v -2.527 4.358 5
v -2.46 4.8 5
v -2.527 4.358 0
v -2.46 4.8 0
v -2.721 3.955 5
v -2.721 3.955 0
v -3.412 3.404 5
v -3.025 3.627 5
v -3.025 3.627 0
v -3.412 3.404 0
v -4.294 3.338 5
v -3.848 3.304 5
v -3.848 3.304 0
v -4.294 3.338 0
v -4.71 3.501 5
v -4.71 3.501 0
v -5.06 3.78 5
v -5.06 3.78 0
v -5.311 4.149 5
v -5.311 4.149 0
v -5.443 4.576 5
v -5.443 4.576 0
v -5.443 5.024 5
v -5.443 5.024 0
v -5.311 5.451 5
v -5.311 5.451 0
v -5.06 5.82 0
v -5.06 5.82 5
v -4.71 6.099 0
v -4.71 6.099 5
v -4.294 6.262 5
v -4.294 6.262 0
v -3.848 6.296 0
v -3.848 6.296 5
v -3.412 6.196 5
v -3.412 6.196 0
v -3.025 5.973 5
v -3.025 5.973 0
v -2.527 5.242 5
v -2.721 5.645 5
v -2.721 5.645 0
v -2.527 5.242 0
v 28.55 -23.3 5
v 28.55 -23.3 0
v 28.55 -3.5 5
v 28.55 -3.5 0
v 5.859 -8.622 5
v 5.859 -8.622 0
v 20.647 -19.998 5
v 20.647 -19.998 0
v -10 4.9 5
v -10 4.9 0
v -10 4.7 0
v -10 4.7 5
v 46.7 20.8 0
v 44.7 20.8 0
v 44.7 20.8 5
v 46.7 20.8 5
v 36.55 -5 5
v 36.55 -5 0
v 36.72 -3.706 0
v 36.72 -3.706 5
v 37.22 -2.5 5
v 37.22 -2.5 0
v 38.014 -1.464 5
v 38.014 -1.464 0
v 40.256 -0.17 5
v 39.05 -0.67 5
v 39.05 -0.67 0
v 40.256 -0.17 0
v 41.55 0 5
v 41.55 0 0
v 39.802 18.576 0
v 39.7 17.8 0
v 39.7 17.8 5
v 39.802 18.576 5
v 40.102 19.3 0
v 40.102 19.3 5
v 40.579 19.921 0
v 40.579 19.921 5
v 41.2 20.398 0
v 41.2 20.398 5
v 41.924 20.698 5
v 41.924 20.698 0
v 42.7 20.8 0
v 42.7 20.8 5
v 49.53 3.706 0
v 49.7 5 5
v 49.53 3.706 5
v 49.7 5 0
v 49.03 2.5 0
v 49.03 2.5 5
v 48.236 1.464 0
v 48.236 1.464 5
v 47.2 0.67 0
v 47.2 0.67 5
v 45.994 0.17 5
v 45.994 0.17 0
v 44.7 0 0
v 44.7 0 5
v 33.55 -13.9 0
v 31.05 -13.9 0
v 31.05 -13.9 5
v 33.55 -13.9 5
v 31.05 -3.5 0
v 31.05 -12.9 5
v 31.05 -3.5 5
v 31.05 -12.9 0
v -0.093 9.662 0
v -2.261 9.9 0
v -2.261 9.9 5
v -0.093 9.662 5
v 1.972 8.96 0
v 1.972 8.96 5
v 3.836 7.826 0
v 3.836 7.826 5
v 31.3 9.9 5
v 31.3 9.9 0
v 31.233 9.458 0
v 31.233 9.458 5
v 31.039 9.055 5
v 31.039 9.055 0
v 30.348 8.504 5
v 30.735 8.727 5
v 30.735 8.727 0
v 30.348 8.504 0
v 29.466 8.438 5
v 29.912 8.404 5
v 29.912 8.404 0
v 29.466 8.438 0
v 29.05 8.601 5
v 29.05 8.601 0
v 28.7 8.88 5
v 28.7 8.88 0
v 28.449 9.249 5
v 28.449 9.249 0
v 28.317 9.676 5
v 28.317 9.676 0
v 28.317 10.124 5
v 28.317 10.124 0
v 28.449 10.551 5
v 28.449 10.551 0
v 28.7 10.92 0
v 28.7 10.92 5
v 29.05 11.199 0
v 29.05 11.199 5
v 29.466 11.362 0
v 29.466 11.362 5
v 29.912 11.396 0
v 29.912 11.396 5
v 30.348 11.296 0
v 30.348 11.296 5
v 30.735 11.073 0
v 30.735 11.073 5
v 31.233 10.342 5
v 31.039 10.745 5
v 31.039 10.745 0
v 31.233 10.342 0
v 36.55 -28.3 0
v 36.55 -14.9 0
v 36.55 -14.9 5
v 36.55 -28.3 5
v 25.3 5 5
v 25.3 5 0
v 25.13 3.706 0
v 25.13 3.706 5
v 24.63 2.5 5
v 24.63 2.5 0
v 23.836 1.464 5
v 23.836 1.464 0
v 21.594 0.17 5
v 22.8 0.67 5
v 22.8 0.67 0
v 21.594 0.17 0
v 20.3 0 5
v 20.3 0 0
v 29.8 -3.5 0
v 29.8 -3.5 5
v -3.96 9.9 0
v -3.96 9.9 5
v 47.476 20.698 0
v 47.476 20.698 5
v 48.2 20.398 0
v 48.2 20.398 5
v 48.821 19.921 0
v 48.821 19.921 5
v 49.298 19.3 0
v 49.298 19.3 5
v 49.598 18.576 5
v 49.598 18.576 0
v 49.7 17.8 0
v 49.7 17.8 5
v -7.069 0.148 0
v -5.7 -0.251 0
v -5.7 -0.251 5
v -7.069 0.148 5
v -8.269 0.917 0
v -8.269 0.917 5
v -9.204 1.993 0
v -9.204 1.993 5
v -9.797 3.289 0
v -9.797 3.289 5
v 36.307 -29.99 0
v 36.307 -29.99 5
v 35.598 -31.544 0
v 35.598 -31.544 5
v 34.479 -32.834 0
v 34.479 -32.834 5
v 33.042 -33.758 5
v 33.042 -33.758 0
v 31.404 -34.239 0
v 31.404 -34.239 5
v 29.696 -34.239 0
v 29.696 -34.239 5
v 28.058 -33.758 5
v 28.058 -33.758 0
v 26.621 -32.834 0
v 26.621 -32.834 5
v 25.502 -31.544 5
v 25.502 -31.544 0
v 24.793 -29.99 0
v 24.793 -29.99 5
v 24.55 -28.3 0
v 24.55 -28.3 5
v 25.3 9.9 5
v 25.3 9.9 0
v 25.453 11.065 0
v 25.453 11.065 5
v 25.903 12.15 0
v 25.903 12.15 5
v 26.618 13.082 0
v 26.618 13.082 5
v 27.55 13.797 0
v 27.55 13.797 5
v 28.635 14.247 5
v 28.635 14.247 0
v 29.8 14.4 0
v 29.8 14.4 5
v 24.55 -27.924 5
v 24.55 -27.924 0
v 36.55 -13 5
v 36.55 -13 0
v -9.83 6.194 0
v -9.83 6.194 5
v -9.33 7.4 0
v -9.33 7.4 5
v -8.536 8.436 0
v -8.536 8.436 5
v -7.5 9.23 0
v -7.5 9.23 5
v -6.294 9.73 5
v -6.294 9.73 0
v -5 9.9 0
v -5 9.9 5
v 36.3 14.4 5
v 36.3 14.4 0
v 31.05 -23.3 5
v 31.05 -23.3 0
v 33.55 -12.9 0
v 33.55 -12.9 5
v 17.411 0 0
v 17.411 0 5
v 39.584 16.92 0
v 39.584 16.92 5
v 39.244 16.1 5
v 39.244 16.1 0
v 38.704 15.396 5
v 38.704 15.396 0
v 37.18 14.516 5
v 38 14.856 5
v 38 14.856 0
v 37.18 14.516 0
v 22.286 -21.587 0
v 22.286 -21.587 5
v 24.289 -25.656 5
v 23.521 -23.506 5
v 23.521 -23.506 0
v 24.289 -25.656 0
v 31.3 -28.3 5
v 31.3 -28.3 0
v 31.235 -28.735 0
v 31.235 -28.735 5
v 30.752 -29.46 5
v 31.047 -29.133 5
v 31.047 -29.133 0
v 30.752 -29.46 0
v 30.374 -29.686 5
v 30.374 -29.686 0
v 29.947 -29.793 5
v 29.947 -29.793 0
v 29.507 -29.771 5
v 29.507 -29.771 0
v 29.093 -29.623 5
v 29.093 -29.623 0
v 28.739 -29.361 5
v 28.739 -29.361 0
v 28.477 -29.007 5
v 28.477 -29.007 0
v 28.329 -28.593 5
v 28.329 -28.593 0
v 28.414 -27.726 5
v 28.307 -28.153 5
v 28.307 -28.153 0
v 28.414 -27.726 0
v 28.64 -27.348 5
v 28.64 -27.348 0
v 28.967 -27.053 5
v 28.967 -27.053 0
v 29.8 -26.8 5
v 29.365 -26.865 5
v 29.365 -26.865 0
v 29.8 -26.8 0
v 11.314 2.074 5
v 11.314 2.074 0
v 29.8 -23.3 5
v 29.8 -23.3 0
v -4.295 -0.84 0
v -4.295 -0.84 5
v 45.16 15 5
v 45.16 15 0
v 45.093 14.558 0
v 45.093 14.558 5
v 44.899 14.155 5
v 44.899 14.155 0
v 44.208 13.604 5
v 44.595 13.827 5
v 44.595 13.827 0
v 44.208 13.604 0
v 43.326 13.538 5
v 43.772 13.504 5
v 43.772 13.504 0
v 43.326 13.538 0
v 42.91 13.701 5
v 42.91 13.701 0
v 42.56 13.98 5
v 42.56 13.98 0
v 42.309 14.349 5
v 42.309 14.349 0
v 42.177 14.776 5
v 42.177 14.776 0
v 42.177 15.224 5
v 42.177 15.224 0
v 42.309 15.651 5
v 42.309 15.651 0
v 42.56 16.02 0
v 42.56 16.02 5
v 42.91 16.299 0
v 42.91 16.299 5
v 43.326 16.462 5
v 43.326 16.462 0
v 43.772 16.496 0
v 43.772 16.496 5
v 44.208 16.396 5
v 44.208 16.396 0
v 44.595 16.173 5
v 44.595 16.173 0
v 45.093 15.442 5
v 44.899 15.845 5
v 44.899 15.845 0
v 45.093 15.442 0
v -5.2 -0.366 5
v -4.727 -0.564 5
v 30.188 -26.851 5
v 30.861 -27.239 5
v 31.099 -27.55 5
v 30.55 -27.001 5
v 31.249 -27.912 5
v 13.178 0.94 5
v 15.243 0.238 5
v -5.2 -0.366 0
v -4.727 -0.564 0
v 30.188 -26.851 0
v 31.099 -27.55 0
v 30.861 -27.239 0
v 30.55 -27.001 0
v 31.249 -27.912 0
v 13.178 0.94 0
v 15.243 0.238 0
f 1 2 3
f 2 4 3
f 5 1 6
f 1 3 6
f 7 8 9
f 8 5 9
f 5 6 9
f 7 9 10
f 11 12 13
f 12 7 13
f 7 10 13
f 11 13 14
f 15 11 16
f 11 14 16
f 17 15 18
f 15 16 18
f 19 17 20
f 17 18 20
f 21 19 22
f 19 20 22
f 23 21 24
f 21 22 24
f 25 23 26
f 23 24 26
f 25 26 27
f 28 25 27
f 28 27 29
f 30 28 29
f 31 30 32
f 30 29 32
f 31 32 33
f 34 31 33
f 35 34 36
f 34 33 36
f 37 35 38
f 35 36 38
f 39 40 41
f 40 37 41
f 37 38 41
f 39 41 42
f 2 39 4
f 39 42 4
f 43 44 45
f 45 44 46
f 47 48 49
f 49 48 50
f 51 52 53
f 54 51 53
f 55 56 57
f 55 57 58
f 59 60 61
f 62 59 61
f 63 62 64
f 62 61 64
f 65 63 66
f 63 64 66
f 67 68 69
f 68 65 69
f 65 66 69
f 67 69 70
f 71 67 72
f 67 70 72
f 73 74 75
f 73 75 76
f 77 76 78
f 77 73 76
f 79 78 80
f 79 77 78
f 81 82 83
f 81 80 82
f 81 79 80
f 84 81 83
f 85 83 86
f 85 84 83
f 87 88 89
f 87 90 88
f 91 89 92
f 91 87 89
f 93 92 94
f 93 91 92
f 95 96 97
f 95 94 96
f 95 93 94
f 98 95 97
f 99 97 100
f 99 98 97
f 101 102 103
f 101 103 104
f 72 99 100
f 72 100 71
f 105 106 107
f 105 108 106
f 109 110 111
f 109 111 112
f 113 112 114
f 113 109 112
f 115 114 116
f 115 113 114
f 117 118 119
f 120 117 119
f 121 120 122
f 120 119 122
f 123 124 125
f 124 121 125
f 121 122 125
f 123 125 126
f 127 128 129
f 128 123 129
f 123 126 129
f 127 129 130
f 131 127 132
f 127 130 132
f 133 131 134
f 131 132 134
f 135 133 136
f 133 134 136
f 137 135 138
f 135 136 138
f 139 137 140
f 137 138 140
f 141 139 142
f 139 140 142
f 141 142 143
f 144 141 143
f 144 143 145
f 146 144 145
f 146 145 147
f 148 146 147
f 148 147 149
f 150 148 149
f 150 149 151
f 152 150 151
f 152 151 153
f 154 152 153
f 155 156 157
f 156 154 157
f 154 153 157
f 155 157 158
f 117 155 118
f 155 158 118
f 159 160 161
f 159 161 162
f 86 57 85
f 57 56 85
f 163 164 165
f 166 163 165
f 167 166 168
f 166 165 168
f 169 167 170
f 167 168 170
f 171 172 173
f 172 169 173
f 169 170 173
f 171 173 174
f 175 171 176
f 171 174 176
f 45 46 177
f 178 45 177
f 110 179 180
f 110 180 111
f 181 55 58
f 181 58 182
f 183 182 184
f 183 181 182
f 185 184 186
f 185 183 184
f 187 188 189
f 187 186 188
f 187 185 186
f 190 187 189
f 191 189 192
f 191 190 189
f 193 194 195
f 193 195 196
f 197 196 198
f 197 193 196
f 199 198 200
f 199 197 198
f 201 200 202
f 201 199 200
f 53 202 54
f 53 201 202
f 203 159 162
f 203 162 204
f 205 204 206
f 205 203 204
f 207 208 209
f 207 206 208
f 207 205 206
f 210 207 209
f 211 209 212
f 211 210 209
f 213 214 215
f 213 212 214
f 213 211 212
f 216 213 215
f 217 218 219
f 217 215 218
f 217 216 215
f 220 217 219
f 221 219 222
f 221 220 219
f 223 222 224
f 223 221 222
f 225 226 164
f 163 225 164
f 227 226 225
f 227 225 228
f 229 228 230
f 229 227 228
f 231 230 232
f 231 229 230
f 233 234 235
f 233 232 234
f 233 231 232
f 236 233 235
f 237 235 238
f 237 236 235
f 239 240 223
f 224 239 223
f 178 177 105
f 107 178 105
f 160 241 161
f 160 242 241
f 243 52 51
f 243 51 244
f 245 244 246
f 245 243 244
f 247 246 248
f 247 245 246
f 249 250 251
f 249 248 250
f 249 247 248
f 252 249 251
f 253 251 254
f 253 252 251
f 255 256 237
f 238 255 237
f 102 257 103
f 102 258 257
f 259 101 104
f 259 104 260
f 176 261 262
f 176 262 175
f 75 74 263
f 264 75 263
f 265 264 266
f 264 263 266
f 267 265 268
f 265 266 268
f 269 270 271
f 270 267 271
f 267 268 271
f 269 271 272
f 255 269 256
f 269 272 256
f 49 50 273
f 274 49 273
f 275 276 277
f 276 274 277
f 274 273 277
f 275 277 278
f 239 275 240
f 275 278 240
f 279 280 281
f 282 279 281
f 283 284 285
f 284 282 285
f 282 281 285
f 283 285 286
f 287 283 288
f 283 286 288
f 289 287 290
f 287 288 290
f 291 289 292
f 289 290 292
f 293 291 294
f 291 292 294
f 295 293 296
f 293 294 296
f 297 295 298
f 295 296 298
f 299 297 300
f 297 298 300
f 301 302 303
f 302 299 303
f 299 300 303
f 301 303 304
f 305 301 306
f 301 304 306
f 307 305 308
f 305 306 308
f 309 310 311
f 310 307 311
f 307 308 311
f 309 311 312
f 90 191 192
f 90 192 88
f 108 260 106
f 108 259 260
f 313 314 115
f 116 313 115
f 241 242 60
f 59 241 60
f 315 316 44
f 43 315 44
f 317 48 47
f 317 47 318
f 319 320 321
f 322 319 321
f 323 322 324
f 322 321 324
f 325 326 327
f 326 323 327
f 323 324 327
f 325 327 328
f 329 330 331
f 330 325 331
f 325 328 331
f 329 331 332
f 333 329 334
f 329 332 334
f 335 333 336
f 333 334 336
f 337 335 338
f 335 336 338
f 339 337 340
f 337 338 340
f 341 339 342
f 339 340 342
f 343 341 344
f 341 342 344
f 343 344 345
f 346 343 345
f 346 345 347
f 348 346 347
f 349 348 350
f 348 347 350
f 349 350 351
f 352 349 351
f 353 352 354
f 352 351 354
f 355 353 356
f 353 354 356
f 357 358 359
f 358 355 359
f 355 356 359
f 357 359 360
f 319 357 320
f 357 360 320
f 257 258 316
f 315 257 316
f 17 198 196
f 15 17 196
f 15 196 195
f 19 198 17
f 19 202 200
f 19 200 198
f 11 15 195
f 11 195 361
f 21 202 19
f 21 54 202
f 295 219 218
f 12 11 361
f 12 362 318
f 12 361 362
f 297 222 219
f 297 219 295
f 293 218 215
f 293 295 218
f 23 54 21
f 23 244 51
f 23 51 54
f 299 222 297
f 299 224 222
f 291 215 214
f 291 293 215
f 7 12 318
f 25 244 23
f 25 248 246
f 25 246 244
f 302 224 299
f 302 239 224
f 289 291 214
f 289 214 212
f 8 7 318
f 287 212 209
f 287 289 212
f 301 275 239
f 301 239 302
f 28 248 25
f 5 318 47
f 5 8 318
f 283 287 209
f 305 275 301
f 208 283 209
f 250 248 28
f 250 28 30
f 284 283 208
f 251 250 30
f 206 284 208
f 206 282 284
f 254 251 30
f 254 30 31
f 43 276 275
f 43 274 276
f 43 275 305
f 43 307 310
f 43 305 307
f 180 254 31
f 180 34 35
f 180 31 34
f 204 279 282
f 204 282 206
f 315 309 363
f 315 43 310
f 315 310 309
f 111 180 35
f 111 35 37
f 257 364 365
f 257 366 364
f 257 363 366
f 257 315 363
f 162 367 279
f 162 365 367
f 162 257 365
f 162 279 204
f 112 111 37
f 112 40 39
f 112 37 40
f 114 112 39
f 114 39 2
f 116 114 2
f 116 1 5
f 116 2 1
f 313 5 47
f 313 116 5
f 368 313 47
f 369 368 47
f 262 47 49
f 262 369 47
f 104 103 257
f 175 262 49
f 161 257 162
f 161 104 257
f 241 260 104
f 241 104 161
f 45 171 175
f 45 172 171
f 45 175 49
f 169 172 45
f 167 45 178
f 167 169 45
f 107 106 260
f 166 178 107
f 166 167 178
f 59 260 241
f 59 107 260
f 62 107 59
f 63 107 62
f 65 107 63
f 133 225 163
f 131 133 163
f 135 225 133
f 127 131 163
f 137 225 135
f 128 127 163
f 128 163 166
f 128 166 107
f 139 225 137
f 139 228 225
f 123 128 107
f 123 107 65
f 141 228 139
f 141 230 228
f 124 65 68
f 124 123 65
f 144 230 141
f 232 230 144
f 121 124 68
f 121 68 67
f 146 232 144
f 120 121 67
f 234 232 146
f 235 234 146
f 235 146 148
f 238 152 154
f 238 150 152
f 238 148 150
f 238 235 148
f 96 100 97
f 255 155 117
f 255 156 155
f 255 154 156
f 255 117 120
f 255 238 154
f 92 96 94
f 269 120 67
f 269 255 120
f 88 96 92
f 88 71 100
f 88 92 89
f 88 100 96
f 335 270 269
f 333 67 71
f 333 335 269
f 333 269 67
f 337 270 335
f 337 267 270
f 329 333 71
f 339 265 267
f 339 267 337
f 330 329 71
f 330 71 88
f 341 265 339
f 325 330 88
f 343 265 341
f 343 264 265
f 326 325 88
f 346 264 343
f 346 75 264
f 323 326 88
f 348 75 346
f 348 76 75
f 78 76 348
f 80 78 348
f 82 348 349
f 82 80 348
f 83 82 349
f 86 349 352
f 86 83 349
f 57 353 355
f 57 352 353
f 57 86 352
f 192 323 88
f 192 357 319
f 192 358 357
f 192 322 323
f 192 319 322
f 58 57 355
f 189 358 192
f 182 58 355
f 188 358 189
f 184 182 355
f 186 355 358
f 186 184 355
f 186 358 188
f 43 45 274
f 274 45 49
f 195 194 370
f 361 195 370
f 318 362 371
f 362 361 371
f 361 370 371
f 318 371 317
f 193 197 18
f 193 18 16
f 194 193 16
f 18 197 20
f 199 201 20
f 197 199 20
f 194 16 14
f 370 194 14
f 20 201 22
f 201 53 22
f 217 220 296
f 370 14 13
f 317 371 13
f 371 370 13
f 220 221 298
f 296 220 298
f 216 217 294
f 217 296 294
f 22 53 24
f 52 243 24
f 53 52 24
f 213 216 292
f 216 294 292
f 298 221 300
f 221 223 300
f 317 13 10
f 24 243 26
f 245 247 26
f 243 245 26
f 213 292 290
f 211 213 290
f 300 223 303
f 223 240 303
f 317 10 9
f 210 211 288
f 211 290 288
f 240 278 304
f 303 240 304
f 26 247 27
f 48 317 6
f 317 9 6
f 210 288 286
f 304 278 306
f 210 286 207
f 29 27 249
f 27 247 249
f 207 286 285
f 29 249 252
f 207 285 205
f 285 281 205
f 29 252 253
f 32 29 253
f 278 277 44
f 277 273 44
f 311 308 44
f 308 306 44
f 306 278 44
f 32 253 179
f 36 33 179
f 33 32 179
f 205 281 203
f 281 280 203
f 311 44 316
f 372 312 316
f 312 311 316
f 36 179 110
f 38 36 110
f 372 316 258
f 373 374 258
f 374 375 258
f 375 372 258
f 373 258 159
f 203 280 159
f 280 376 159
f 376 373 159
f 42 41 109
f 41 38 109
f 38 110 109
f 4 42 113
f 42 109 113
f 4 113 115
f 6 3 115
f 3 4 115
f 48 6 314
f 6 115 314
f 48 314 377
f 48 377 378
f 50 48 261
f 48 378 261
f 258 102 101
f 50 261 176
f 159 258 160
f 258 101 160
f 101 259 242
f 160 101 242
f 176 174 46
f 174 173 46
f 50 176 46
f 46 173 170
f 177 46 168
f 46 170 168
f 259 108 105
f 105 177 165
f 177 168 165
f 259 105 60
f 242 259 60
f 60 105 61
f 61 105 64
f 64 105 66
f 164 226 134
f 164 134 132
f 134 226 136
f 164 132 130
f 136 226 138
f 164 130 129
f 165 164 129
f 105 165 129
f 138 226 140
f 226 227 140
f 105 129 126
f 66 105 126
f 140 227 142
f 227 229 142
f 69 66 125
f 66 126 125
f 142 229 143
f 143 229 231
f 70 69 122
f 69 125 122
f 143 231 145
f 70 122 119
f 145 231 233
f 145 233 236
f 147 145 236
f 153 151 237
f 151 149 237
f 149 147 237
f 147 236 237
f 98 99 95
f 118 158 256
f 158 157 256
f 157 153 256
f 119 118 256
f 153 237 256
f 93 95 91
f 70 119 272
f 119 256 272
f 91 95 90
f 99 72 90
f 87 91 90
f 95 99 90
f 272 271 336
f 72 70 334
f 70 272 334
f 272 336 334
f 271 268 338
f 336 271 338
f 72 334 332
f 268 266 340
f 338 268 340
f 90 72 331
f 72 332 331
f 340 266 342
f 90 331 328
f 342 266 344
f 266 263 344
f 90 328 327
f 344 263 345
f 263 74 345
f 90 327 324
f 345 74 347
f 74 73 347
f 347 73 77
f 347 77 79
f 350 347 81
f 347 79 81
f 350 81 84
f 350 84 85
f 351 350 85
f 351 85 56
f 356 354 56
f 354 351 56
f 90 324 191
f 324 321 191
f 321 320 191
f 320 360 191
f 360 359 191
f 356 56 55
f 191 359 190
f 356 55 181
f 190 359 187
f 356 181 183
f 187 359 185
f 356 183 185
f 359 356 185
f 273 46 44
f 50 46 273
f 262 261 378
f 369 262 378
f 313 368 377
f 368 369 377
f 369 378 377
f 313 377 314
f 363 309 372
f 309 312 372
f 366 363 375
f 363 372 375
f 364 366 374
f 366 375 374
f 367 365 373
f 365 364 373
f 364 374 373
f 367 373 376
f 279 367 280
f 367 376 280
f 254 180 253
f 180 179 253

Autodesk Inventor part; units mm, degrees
ref_plane "YZ Plane" through (0, 0, 0) normal (1, 0, 0) x (0, 1, 0)
ref_plane "XZ Plane" through (0, 0, 0) normal (0, 1, 0) x (-1, 0, 0)
ref_plane "XY Plane" through (0, 0, 0) normal (0, 0, 1) x (1, 0, 0)
sketch "Sketch1" plane through (0, 0, 0) normal (0, 0, 1) x (1, 0, 0)
  line L0 (17.4112, 0) -> (20.3, 0)
  circle A0 centre (43.66, 15) radius 1.5
  circle A1 centre (-3.96, 4.8) radius 1.5
  line L1 (29.8, -3.5) -> (31.05, -3.5)
  line L2 (31.05, -23.3) -> (28.55, -23.3)
  line L3 (28.55, -23.3) -> (28.55, -3.5)
  line L4 (28.55, -3.5) -> (29.8, -3.5)
  line L5 (29.8, -23.3) -> (29.8, -28.3)
  circle A2 centre (29.8, -28.3) radius 1.5
  line L6 (31.05, -23.3) -> (31.05, -13.9)
  line L7 (31.05, -13.9) -> (33.55, -13.9)
  line L8 (33.55, -13.9) -> (33.55, -12.9)
  line L9 (33.55, -12.9) -> (31.05, -12.9)
  line L10 (31.05, -12.9) -> (31.05, -3.5)
  line L11 (36.55, -14.9) -> (36.55, -28.3)
  line L12 (49.7, 17.8) -> (49.7, 5)
  line L13 (36.55, -13) -> (36.55, -14.9)
  arc A3 (24.55, -28.3) -> (36.55, -28.3) centre (30.55, -28.3) ccw
  line L14 (24.55, -27.924) -> (24.55, -28.3)
  line L15 (5.8588, -8.6221) -> (20.6471, -19.9978)
  circle A4 centre (29.8, 9.9) radius 1.5
  arc A5 (29.8, 14.4) -> (25.3, 9.9) centre (29.8, 9.9) ccw
  line L16 (25.3, 9.9) -> (25.3, 5)
  line L17 (36.55, -13) -> (36.55, -5)
  line L18 (44.7, 0) -> (41.55, 0)
  line L19 (36.3, 14.4) -> (29.8, 14.4)
  arc A6 (36.3, 14.4) -> (39.7, 17.8) centre (36.3, 17.8) ccw
  arc A7 (41.55, 0) -> (36.55, -5) centre (41.55, -5) ccw
  arc A8 (44.7, 0) -> (49.7, 5) centre (44.7, 5) ccw
  arc A9 (20.3, 0) -> (25.3, 5) centre (20.3, 5) ccw
  arc A10 (24.55, -27.924) -> (20.6471, -19.9978) centre (14.55, -27.924) ccw
  line L20 (-3.96, 9.9) -> (-2.2612, 9.9)
  line L21 (-3.96, 9.9) -> (-5, 9.9)
  line L22 (-10, 4.9) -> (-10, 4.7)
  line L23 (11.3141, 2.0738) -> (3.8359, 7.8262)
  arc A11 (11.3141, 2.0738) -> (17.4112, 0) centre (17.4112, 10) ccw
  arc A12 (3.8359, 7.8262) -> (-2.2612, 9.9) centre (-2.2612, -0.1) ccw
  arc A13 (-5, 9.9) -> (-10, 4.9) centre (-5, 4.9) ccw
  arc A14 (-10, 4.7) -> (-5.7001, -0.2507) centre (-5, 4.7) ccw
  line L24 (5.8588, -8.6221) -> (-4.2953, -0.8401)
  arc A15 (-4.2953, -0.8401) -> (-5.7001, -0.2507) centre (-6.1202, -3.2212) ccw
  line L25 (39.7, 17.8) -> (39.7, 17.8)
  line L26 (49.7, 17.8) -> (49.7, 17.8)
  line L27 (44.7, 20.8) -> (46.7, 20.8)
  line L28 (44.7, 20.8) -> (42.7, 20.8)
  arc A16 (42.7, 20.8) -> (39.7, 17.8) centre (42.7, 17.8) ccw
  arc A17 (49.7, 17.8) -> (46.7, 20.8) centre (46.7, 17.8) ccw
  dimension "d13" = 1.25
  dimension "d15" = 2.5
  dimension "d16" = 19.8
  dimension "d17" = 5
  dimension "d25" = 9.4
  dimension "d26" = 2.5
  dimension "d27" = 1
  dimension "d70" = 5
  dimension "d71" = 5
  dimension "d72" = 10
  dimension "d79" = 10
  dimension "d80" = 5
  dimension "d83" = 3
  dimension "d85" = 3
extrude "Extrusion1" add sketch "Sketch1" along normal blind 5
properties part number "braket bawah 2"
